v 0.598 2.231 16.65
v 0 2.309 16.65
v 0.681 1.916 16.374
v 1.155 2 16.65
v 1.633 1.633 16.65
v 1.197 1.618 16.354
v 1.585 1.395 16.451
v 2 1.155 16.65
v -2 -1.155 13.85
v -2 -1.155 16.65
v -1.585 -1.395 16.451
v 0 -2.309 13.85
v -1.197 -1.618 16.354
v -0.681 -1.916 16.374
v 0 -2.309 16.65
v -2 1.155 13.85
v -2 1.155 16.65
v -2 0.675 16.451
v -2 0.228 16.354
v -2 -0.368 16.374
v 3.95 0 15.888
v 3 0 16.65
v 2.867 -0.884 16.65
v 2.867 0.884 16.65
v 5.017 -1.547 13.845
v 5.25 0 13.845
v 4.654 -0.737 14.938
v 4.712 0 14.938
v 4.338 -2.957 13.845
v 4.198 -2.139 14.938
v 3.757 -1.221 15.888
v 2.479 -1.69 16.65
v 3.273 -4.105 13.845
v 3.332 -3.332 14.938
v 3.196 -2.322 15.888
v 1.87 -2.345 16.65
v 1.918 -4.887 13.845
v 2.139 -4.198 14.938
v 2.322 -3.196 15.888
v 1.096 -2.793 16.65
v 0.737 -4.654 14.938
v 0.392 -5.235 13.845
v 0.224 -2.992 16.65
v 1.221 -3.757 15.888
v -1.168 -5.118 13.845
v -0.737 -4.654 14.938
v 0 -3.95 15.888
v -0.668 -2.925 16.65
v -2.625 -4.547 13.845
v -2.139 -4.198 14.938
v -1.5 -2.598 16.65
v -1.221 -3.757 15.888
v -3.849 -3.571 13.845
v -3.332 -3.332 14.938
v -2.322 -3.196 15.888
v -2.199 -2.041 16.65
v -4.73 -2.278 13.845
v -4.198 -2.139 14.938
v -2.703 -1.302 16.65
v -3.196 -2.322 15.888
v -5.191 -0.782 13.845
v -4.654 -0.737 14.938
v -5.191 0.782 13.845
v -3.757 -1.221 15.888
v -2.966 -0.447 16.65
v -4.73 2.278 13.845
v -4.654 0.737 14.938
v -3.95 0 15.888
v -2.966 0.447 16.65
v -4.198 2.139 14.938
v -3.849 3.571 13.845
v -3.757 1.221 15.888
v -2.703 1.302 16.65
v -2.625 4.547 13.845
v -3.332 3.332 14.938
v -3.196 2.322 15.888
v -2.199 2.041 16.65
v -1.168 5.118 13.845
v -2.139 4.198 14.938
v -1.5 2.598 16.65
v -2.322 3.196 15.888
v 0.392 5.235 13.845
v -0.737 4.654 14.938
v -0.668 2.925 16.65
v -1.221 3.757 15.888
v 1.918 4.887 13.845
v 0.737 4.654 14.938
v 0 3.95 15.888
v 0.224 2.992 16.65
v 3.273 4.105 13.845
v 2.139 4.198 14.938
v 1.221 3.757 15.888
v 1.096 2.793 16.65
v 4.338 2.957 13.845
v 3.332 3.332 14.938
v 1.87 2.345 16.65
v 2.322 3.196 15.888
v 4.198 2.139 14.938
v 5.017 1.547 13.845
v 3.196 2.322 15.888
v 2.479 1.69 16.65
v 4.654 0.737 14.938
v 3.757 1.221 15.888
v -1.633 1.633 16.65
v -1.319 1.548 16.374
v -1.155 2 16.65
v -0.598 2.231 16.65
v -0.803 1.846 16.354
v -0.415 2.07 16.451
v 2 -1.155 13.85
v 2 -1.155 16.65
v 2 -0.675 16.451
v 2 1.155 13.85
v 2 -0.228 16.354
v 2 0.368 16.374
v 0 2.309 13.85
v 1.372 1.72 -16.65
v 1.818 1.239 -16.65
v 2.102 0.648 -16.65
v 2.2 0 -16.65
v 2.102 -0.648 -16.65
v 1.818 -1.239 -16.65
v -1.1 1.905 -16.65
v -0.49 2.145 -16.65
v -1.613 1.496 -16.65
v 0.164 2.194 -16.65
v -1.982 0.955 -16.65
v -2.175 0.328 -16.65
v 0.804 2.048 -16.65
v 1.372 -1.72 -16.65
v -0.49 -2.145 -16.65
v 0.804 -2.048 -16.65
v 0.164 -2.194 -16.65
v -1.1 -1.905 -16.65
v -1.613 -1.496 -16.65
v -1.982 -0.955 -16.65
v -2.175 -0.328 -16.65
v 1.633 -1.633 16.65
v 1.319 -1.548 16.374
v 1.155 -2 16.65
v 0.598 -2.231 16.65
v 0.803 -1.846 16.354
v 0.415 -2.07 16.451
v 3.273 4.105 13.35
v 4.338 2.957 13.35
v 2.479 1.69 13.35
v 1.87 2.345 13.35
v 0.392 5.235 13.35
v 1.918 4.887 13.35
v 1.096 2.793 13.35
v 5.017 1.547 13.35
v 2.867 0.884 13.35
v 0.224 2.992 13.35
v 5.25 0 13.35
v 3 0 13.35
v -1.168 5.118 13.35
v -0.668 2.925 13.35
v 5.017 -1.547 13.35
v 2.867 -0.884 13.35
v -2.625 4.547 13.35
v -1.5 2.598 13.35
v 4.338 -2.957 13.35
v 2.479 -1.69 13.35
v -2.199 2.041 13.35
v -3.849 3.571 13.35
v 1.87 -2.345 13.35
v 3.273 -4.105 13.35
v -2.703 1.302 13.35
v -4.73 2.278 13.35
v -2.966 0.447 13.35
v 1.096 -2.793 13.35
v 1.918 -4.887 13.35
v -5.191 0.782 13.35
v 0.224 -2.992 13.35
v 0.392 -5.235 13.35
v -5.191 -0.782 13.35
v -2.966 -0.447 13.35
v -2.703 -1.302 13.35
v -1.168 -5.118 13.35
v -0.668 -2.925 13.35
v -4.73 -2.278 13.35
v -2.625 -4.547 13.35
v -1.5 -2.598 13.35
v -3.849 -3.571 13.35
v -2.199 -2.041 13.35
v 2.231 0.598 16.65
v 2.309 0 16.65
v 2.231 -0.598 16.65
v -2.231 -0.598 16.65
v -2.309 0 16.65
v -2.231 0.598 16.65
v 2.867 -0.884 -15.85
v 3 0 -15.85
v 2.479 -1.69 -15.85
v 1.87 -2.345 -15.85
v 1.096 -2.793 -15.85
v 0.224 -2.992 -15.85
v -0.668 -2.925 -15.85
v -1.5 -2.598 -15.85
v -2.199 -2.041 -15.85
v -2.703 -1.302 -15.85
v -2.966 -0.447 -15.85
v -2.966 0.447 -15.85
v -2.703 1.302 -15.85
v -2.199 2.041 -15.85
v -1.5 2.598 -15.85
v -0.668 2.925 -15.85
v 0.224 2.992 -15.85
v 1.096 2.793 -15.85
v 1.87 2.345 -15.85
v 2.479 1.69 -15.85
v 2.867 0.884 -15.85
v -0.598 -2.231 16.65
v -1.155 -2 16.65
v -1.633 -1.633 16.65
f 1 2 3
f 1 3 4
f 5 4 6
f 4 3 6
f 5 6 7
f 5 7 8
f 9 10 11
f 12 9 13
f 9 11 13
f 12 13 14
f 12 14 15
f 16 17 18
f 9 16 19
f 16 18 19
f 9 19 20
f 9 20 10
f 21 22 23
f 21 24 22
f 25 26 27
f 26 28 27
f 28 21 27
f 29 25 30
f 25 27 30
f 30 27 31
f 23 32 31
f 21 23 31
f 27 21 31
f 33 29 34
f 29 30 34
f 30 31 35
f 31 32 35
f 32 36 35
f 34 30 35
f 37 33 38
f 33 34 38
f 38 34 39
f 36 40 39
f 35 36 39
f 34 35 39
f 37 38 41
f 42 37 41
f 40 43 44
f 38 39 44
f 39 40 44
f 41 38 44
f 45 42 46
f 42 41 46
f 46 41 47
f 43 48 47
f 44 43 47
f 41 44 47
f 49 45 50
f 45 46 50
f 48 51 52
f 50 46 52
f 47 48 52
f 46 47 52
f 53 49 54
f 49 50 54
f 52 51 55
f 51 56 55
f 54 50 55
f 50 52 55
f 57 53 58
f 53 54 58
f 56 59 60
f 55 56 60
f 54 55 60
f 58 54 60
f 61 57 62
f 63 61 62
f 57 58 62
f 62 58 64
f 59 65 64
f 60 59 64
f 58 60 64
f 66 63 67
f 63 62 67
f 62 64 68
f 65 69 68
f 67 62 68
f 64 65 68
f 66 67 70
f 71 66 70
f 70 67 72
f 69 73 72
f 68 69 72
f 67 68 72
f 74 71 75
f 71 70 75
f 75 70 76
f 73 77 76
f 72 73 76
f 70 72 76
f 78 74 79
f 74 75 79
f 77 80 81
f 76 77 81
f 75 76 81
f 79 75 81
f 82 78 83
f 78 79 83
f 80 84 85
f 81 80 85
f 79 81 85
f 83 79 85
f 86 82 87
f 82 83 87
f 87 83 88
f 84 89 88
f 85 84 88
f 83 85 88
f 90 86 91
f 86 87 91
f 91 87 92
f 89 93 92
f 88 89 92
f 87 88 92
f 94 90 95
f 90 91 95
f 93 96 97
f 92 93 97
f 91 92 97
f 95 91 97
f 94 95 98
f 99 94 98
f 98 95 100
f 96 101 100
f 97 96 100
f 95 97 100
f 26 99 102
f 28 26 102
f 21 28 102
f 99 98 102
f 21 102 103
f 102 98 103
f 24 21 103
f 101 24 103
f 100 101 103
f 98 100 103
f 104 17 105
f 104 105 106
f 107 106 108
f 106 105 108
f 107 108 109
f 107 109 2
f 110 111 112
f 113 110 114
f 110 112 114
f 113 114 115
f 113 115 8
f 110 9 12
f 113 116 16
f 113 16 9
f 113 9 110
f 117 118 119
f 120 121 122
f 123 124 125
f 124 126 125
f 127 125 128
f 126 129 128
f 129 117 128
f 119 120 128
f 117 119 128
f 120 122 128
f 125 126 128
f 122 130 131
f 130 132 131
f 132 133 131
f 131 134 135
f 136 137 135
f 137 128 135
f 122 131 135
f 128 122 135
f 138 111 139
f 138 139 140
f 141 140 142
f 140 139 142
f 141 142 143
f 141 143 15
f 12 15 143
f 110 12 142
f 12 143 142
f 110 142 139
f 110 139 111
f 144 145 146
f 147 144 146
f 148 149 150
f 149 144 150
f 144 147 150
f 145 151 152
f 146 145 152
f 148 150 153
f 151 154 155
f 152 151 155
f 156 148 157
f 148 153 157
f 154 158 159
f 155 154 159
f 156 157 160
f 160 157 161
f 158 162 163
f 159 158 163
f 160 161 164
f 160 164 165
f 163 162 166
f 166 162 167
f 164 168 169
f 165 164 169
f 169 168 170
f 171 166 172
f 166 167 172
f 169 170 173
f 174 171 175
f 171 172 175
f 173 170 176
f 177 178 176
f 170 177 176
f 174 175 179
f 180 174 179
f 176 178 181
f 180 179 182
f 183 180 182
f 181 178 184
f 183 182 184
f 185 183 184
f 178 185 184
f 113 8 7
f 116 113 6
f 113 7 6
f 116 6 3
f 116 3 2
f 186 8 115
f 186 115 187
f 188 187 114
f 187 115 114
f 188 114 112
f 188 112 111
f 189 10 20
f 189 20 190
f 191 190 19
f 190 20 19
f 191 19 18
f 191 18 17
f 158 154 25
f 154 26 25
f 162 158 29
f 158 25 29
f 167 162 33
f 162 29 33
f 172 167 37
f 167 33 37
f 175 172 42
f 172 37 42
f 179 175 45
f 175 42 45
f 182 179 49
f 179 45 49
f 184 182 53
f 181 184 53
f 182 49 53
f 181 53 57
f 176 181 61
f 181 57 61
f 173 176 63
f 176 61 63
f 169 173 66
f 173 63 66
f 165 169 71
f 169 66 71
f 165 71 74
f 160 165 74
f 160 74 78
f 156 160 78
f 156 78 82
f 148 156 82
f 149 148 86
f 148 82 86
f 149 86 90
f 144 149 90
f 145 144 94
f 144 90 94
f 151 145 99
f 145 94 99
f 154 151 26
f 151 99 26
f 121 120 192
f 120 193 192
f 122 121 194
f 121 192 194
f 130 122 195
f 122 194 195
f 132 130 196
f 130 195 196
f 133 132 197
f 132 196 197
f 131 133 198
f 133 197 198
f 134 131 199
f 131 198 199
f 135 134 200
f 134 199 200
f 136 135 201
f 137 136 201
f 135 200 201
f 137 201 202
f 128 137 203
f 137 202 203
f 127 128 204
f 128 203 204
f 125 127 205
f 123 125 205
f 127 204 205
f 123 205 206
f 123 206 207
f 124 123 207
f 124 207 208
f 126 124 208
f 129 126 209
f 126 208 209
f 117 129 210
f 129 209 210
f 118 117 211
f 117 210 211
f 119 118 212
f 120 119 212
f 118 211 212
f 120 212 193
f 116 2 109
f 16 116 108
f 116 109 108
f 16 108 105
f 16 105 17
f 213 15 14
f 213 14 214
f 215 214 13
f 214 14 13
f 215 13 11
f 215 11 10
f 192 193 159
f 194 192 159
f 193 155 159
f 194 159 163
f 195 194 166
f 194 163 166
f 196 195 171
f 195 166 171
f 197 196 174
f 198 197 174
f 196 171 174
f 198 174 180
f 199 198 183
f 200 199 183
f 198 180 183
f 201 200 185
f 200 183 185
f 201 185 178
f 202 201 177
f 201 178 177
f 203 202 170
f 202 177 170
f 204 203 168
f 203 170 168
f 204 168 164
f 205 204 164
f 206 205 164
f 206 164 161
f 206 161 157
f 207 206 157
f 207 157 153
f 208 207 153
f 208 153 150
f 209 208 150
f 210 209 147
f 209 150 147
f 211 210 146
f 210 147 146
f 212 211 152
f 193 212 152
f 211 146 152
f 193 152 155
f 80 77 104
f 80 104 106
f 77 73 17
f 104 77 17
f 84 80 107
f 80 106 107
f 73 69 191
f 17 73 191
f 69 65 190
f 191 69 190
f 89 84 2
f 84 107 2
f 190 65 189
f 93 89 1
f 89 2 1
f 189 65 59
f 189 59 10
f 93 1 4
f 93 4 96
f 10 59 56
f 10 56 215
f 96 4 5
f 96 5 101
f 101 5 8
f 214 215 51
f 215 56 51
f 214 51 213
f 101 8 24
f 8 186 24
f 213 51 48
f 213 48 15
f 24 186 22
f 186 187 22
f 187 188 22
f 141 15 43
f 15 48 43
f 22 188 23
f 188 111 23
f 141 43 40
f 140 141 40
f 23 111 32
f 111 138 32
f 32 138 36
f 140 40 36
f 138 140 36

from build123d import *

# Parameters (mm, degrees)
CUT_EXTRUDE1_DEPTH = 2.8


with BuildPart() as part:
    # Sketch2 → Revolve1 (revolve)
    with BuildSketch(Plane(origin=(0, 0, 0), x_dir=(0, 0, -1), z_dir=(1, 0, 0)), mode=Mode.PRIVATE) as revolve1_sk:
        with BuildLine():
            Line((-16.65, 0), (16.65, 0))
            Line((16.65, 0), (16.65, 2.2))
            Line((16.65, 2.2), (15.85, 3))
            Line((15.85, 3), (-13.35, 3))
            Line((-13.35, 3), (-13.35, 5.25))
            Line((-13.35, 5.25), (-13.845, 5.25))
            ThreePointArc((-13.845, 5.25), (-15.433520981, 4.356906156), (-16.65, 3))
            Line((-16.65, 3), (-16.65, 0))
        make_face()
    revolve(revolve1_sk.sketch.rotate(Axis((0, 0, 16.65), (0, 0, -1)), 90), axis=Axis((0, 0, 16.65), (0, 0, -1)))

    # Sketch3 → Cut-Extrude1 (cut)
    with BuildSketch(Plane.XY.offset(16.65)):
        Polygon((0, 2.309401077), (-2, 1.154700538), (-2, -1.154700538), (0, -2.309401077), (2, -1.154700538), (2, 1.154700538), align=None)
    extrude(amount=-CUT_EXTRUDE1_DEPTH, mode=Mode.SUBTRACT)

    # Cut-Extrude2 cone 1 section (through the dimple's axis) → Cut-Extrude2 (revolve, cut)
    with BuildSketch(Plane(origin=(0, 0, 16.65), x_dir=(0, -1, 0), z_dir=(1, 0, 0))):
        Polygon((0, 0), (2.309401077, 0), (0, 2.309401077), align=None)
    revolve(axis=Axis((0, 0, 16.65), (0, 0, -1)), mode=Mode.SUBTRACT)


solid = part.part
